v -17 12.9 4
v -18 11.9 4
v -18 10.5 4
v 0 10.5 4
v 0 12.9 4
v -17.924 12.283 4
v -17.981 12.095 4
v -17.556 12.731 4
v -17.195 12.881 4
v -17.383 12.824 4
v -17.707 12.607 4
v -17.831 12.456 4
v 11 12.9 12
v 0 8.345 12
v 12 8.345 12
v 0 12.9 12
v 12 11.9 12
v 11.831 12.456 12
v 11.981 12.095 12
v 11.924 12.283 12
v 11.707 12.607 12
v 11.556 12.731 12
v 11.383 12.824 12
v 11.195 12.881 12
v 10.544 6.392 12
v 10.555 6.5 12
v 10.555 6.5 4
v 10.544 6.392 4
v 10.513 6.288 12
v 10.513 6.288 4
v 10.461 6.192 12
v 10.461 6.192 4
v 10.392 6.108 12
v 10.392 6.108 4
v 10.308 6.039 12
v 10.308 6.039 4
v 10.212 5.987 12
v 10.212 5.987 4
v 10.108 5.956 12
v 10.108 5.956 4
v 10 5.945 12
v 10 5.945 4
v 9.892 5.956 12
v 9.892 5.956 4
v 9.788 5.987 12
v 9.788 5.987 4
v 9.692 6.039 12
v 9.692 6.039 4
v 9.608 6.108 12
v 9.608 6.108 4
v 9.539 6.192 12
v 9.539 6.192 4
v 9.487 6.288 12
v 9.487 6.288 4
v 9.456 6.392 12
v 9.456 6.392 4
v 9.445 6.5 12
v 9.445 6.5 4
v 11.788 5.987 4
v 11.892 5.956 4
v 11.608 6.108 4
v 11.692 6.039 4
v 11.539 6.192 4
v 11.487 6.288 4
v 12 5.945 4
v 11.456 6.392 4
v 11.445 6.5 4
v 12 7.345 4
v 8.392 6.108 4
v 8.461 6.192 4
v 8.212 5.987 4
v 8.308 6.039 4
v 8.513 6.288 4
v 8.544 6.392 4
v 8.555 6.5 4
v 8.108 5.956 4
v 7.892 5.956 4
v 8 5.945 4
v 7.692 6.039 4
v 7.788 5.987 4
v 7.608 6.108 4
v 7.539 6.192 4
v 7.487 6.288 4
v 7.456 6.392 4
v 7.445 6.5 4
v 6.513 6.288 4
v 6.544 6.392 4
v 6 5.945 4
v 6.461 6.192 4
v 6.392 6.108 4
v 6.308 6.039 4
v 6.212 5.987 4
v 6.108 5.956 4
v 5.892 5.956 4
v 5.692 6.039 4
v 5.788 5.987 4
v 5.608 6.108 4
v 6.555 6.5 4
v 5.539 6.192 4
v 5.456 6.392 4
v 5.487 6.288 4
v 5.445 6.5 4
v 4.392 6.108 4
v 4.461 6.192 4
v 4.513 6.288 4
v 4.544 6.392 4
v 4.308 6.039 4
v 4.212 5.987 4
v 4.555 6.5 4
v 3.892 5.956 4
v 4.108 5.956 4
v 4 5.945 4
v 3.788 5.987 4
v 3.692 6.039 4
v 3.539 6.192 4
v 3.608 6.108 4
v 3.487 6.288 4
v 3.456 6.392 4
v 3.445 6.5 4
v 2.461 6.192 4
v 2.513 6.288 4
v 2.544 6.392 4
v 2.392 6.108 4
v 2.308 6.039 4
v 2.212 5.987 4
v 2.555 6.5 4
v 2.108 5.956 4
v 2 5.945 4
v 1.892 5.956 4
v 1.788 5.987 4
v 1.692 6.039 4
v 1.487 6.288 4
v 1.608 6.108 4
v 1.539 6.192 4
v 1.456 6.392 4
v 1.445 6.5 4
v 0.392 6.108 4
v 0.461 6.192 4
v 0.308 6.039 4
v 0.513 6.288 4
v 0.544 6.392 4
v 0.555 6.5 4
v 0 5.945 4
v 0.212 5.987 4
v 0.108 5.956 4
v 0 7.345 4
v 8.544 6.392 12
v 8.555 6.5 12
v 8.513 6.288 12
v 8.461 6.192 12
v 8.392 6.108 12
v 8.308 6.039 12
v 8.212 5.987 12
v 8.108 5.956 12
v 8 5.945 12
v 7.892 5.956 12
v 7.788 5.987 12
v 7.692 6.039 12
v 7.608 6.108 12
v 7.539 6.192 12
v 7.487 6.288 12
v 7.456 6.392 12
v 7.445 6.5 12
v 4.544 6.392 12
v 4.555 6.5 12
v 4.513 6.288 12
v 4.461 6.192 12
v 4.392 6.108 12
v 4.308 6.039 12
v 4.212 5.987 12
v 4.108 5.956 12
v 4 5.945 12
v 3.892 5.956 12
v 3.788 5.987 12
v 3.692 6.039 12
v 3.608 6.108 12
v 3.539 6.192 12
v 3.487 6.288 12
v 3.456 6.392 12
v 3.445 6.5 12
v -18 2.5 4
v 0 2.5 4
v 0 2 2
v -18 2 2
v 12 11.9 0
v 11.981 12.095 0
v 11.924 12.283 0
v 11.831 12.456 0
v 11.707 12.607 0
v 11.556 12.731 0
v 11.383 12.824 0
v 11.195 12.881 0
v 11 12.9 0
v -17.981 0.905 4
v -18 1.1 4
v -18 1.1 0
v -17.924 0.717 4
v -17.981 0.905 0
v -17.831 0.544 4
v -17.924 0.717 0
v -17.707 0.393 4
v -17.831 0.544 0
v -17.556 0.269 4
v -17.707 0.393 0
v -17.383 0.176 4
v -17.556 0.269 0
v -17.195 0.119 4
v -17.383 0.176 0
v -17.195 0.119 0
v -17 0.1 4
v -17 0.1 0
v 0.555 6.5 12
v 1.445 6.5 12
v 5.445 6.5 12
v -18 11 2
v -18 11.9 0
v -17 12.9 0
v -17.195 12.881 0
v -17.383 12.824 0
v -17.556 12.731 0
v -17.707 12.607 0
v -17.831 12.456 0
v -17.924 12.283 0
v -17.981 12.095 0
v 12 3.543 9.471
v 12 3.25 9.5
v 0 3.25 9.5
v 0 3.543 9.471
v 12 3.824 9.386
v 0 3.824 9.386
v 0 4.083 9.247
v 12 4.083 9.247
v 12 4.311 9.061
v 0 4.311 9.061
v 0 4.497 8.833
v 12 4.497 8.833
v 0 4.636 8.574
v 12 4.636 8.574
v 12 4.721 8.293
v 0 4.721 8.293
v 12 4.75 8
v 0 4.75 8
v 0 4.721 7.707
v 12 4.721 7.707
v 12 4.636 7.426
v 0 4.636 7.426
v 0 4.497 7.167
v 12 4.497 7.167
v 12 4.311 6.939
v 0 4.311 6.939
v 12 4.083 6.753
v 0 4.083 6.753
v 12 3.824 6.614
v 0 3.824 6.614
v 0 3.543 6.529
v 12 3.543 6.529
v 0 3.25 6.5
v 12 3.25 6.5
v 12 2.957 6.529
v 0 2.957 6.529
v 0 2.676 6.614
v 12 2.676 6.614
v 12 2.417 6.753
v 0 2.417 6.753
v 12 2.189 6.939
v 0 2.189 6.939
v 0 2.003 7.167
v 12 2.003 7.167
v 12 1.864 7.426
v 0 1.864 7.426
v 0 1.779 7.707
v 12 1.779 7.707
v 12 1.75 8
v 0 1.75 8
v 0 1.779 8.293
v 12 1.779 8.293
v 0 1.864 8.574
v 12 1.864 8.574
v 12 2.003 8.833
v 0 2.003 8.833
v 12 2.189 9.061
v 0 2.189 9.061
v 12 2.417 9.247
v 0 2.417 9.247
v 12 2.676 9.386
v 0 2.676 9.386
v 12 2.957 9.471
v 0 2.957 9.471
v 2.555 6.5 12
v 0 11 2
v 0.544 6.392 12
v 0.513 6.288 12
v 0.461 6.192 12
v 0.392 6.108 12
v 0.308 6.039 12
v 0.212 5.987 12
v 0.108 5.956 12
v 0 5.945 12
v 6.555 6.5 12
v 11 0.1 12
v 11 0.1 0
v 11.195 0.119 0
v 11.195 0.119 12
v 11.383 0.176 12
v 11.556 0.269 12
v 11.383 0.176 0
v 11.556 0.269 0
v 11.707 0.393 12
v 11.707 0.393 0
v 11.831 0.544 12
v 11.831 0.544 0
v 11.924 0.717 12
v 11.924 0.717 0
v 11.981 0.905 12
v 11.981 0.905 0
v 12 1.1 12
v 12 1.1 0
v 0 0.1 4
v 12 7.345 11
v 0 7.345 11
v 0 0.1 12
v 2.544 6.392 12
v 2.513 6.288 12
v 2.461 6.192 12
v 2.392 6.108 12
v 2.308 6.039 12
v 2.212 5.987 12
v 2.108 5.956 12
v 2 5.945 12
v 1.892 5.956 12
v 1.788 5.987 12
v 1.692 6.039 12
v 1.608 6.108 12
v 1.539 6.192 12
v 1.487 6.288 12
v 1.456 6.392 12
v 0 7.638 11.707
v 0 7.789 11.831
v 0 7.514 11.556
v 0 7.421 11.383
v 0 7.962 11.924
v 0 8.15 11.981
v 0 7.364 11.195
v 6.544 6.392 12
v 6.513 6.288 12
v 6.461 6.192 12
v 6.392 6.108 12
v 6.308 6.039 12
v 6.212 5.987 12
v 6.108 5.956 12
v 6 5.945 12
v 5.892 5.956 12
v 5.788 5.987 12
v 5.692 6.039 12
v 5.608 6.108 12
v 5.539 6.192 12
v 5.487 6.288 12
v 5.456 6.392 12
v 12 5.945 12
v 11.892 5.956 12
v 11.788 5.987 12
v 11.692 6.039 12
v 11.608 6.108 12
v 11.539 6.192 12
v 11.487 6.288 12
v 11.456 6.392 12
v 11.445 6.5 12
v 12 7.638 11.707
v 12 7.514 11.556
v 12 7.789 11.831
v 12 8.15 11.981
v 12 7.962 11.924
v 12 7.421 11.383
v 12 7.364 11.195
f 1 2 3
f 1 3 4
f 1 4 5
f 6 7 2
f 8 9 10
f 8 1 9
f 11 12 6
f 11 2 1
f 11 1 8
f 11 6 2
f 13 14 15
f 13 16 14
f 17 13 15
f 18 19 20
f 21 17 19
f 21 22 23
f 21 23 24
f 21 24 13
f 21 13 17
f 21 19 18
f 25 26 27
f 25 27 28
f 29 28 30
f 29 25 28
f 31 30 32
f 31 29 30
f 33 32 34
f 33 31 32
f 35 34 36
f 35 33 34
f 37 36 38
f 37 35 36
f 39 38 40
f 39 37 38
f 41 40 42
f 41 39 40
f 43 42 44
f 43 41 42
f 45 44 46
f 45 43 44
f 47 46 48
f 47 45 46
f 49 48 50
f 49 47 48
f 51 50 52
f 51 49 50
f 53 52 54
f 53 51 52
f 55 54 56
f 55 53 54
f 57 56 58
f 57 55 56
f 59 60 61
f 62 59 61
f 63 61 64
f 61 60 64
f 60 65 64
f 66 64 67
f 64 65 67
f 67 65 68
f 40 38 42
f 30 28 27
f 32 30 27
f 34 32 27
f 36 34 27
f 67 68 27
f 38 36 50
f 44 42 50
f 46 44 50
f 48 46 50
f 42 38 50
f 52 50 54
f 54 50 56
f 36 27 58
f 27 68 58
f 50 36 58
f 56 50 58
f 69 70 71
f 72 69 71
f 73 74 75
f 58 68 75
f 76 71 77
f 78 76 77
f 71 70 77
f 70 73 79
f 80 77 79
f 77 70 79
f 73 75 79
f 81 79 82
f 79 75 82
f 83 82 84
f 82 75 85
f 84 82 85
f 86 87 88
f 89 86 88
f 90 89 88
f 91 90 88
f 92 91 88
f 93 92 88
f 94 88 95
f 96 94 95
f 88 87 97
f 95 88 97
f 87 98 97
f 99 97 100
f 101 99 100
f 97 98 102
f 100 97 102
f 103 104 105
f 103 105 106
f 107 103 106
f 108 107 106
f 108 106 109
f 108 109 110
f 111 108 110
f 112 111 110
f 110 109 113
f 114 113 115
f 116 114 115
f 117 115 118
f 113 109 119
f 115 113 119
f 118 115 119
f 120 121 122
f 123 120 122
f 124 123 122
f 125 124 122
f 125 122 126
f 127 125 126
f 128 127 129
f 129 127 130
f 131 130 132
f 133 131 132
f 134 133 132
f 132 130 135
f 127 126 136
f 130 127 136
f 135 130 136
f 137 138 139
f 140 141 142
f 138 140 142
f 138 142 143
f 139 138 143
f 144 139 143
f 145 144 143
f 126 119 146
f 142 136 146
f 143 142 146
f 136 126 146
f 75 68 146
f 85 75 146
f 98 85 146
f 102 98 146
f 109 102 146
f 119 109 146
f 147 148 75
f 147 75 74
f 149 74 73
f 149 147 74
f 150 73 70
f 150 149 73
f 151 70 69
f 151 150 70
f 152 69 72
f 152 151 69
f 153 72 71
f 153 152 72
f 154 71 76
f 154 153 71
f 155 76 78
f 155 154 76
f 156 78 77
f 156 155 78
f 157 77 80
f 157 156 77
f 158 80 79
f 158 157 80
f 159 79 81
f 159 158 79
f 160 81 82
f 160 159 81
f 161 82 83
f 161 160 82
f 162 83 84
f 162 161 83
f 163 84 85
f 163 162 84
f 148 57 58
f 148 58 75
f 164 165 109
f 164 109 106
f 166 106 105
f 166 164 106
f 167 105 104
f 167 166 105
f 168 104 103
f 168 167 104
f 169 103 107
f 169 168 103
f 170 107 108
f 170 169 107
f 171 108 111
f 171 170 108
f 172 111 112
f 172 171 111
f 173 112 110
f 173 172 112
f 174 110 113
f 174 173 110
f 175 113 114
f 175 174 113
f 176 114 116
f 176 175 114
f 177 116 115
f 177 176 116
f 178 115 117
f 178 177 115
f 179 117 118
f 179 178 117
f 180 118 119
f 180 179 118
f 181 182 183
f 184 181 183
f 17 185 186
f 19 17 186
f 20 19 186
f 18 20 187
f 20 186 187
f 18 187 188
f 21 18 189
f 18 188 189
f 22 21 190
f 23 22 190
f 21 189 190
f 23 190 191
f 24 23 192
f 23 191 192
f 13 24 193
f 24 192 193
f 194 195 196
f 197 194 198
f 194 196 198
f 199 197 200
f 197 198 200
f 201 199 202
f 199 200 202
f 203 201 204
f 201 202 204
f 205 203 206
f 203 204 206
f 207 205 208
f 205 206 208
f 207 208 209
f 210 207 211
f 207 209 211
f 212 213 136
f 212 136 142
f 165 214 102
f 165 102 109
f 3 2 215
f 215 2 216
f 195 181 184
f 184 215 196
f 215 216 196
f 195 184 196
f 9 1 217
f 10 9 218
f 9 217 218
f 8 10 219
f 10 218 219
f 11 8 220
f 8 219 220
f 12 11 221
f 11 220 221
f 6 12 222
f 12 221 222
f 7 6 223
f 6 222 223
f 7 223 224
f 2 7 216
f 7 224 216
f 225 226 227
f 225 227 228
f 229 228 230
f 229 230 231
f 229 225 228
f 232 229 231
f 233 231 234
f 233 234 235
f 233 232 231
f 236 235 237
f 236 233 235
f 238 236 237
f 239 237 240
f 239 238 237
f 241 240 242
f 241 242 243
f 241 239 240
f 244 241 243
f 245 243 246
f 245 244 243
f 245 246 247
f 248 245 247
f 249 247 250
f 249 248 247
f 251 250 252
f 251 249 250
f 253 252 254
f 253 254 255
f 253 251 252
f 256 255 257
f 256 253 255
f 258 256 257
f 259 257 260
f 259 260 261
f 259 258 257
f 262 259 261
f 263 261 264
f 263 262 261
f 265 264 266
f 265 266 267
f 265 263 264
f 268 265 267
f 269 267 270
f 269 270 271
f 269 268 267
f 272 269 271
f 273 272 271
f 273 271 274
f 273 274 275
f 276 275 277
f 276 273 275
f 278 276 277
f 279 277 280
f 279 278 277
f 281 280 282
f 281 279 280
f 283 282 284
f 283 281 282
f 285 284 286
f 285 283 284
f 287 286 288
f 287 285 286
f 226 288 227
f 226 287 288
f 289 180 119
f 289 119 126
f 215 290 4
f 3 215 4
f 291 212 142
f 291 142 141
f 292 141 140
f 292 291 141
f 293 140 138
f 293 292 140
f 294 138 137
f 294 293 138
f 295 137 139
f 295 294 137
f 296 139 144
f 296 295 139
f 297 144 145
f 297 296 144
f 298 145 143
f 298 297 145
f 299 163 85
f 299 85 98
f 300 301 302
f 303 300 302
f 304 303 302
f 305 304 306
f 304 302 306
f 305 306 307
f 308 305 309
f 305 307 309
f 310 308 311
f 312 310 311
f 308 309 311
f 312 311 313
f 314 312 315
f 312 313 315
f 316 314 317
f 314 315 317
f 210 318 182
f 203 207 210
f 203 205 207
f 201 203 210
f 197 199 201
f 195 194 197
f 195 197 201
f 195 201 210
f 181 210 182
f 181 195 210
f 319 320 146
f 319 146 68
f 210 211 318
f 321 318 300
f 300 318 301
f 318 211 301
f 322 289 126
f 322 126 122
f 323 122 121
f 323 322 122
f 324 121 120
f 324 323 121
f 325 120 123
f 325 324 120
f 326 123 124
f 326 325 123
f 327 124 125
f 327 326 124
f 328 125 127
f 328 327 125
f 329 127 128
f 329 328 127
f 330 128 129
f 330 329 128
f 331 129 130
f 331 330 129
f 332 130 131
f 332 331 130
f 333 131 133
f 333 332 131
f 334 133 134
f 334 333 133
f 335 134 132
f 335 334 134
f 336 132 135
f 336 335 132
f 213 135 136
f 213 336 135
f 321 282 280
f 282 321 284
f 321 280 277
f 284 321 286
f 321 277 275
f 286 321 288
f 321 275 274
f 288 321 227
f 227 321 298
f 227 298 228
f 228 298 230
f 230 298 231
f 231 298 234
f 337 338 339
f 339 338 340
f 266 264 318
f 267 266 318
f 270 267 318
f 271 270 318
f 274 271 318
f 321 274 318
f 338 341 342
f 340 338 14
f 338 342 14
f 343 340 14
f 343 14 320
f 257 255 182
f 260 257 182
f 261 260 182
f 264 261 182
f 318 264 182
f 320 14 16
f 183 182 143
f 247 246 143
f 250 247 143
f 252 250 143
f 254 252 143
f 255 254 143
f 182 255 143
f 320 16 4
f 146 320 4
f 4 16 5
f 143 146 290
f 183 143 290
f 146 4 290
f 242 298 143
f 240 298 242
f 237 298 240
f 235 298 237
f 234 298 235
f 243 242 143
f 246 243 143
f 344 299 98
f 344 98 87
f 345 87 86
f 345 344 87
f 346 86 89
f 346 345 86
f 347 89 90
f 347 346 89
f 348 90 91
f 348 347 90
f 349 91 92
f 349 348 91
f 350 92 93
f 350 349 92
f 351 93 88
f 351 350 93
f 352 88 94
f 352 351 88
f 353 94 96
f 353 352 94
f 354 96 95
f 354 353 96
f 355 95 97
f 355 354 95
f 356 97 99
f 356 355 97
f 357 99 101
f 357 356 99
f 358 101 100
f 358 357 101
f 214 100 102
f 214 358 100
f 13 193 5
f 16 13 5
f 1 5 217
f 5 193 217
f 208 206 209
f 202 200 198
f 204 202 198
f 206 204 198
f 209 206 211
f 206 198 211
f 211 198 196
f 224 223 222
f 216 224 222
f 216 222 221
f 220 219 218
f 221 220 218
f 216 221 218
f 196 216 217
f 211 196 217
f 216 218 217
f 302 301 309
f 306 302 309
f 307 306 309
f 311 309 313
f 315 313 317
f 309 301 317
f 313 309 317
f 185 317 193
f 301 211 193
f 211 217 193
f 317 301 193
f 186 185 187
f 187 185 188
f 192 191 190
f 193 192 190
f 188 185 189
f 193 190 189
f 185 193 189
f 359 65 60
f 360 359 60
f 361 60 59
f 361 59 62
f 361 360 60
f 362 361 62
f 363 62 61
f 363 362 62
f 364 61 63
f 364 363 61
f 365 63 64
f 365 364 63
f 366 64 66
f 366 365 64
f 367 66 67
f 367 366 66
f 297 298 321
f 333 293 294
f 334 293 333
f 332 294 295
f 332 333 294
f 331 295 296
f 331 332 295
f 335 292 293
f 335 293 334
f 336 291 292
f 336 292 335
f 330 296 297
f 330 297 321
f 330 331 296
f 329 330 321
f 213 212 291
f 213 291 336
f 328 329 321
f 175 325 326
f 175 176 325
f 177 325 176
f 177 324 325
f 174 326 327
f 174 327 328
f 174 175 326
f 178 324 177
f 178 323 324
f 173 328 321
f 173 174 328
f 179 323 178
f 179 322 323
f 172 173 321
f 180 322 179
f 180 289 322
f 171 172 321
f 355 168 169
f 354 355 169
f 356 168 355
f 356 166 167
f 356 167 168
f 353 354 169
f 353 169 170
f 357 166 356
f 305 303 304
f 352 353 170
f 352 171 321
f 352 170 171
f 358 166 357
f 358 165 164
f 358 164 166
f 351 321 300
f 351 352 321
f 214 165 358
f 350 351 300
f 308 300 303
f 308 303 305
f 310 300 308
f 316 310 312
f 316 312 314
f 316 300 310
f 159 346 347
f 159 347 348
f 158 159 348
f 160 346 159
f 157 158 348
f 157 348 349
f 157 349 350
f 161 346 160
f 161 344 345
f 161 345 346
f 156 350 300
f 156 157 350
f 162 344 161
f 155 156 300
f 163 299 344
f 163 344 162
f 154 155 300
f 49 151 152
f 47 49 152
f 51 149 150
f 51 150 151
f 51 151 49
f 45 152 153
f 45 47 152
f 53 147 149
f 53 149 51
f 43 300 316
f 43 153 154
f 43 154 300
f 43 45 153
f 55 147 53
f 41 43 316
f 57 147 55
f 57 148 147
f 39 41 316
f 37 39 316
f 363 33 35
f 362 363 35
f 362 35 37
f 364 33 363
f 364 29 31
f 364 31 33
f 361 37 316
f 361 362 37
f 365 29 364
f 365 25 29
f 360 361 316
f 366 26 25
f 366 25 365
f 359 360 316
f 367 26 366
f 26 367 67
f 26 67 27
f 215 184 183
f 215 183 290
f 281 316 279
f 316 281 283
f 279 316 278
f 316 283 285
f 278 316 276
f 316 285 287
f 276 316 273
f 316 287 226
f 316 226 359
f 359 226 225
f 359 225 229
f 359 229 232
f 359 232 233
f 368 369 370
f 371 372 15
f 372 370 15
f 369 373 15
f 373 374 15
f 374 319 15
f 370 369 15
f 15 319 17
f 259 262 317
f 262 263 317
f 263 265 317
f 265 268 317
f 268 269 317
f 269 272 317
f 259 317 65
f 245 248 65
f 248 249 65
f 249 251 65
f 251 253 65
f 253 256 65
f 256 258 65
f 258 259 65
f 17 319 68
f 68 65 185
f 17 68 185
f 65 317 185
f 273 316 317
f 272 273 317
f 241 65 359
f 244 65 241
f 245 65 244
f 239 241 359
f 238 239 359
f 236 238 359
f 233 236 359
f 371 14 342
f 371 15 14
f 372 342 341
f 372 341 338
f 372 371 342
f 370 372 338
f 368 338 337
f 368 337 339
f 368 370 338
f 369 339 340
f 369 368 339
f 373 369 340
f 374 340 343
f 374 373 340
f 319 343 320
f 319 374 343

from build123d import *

# Parameters (mm, degrees)
BOSS_EXTRUDE1_DEPTH = 12
CUT_EXTRUDE1_DEPTH  = 8
FILLET1_R           = 1
CUT_EXTRUDE3_DEPTH  = 18
SKETCH6_R           = 1.5
CUT_EXTRUDE2_DEPTH  = 12


with BuildPart() as part:
    # Sketch4 → Boss-Extrude1 (new body)
    with BuildSketch(Plane.XY):
        with BuildLine():
            Line((12, 1.1), (12, 11.9))
            ThreePointArc((12, 11.9), (11.707106781, 12.607106781), (11, 12.9))
            Line((11, 12.9), (-17, 12.9))
            ThreePointArc((-17, 12.9), (-17.707106781, 12.607106781), (-18, 11.9))
            Line((-18, 11.9), (-18, 1.1))
            ThreePointArc((-18, 1.1), (-17.707106781, 0.392893219), (-17, 0.1))
            Line((-17, 0.1), (11, 0.1))
            ThreePointArc((11, 0.1), (11.707106781, 0.392893219), (12, 1.1))
        make_face()
    extrude(amount=BOSS_EXTRUDE1_DEPTH)

    # Sketch5 → Cut-Extrude1 (cut)
    with BuildSketch(Plane.XY.offset(12)):
        with BuildLine():
            Line((11.445, 6.5), (10.555, 6.5))
            ThreePointArc((10.555, 6.5), (10, 5.945), (9.445, 6.5))
            Line((9.445, 6.5), (8.555, 6.5))
            ThreePointArc((8.555, 6.5), (8, 5.945), (7.445, 6.5))
            Line((7.445, 6.5), (6.555, 6.5))
            ThreePointArc((6.555, 6.5), (6, 5.945), (5.445, 6.5))
            Line((5.445, 6.5), (4.555, 6.5))
            ThreePointArc((4.555, 6.5), (4, 5.945), (3.445, 6.5))
            Line((3.445, 6.5), (2.555, 6.5))
            ThreePointArc((2.555, 6.5), (2, 5.945), (1.445, 6.5))
            Line((1.445, 6.5), (0.555, 6.5))
            ThreePointArc((0.555, 6.5), (0.392444264, 6.107555736), (0, 5.945))
            Line((0, 5.945), (0, 7.345))
            Line((0, 7.345), (12, 7.345))
            Line((12, 7.345), (12, 5.945))
            ThreePointArc((12, 5.945), (11.607555736, 6.107555736), (11.445, 6.5))
        make_face()
    extrude(amount=-CUT_EXTRUDE1_DEPTH, mode=Mode.SUBTRACT)

    # Fillet1
    fillet1_edges = [part.edges().sort_by_distance(p)[0] for p in [
        (6, 7.345, 12),
    ]]
    fillet(fillet1_edges, radius=FILLET1_R)

    # Sketch7 → Cut-Extrude3 (cut)
    with BuildSketch(Plane.ZY.offset(18)):
        Polygon((4, 10.5), (4, 12.9), (12, 12.9), (12, 0.1), (4, 0.1), (4, 2.5), (2, 2), (2, 11), align=None)
    extrude(amount=-CUT_EXTRUDE3_DEPTH, mode=Mode.SUBTRACT)

    # Sketch6 → Cut-Extrude2 (cut)
    with BuildSketch(Plane.ZY.offset(-12)):
        with Locations((8, 3.25)):
            Circle(SKETCH6_R)
    extrude(amount=CUT_EXTRUDE2_DEPTH, mode=Mode.SUBTRACT)


solid = part.part
